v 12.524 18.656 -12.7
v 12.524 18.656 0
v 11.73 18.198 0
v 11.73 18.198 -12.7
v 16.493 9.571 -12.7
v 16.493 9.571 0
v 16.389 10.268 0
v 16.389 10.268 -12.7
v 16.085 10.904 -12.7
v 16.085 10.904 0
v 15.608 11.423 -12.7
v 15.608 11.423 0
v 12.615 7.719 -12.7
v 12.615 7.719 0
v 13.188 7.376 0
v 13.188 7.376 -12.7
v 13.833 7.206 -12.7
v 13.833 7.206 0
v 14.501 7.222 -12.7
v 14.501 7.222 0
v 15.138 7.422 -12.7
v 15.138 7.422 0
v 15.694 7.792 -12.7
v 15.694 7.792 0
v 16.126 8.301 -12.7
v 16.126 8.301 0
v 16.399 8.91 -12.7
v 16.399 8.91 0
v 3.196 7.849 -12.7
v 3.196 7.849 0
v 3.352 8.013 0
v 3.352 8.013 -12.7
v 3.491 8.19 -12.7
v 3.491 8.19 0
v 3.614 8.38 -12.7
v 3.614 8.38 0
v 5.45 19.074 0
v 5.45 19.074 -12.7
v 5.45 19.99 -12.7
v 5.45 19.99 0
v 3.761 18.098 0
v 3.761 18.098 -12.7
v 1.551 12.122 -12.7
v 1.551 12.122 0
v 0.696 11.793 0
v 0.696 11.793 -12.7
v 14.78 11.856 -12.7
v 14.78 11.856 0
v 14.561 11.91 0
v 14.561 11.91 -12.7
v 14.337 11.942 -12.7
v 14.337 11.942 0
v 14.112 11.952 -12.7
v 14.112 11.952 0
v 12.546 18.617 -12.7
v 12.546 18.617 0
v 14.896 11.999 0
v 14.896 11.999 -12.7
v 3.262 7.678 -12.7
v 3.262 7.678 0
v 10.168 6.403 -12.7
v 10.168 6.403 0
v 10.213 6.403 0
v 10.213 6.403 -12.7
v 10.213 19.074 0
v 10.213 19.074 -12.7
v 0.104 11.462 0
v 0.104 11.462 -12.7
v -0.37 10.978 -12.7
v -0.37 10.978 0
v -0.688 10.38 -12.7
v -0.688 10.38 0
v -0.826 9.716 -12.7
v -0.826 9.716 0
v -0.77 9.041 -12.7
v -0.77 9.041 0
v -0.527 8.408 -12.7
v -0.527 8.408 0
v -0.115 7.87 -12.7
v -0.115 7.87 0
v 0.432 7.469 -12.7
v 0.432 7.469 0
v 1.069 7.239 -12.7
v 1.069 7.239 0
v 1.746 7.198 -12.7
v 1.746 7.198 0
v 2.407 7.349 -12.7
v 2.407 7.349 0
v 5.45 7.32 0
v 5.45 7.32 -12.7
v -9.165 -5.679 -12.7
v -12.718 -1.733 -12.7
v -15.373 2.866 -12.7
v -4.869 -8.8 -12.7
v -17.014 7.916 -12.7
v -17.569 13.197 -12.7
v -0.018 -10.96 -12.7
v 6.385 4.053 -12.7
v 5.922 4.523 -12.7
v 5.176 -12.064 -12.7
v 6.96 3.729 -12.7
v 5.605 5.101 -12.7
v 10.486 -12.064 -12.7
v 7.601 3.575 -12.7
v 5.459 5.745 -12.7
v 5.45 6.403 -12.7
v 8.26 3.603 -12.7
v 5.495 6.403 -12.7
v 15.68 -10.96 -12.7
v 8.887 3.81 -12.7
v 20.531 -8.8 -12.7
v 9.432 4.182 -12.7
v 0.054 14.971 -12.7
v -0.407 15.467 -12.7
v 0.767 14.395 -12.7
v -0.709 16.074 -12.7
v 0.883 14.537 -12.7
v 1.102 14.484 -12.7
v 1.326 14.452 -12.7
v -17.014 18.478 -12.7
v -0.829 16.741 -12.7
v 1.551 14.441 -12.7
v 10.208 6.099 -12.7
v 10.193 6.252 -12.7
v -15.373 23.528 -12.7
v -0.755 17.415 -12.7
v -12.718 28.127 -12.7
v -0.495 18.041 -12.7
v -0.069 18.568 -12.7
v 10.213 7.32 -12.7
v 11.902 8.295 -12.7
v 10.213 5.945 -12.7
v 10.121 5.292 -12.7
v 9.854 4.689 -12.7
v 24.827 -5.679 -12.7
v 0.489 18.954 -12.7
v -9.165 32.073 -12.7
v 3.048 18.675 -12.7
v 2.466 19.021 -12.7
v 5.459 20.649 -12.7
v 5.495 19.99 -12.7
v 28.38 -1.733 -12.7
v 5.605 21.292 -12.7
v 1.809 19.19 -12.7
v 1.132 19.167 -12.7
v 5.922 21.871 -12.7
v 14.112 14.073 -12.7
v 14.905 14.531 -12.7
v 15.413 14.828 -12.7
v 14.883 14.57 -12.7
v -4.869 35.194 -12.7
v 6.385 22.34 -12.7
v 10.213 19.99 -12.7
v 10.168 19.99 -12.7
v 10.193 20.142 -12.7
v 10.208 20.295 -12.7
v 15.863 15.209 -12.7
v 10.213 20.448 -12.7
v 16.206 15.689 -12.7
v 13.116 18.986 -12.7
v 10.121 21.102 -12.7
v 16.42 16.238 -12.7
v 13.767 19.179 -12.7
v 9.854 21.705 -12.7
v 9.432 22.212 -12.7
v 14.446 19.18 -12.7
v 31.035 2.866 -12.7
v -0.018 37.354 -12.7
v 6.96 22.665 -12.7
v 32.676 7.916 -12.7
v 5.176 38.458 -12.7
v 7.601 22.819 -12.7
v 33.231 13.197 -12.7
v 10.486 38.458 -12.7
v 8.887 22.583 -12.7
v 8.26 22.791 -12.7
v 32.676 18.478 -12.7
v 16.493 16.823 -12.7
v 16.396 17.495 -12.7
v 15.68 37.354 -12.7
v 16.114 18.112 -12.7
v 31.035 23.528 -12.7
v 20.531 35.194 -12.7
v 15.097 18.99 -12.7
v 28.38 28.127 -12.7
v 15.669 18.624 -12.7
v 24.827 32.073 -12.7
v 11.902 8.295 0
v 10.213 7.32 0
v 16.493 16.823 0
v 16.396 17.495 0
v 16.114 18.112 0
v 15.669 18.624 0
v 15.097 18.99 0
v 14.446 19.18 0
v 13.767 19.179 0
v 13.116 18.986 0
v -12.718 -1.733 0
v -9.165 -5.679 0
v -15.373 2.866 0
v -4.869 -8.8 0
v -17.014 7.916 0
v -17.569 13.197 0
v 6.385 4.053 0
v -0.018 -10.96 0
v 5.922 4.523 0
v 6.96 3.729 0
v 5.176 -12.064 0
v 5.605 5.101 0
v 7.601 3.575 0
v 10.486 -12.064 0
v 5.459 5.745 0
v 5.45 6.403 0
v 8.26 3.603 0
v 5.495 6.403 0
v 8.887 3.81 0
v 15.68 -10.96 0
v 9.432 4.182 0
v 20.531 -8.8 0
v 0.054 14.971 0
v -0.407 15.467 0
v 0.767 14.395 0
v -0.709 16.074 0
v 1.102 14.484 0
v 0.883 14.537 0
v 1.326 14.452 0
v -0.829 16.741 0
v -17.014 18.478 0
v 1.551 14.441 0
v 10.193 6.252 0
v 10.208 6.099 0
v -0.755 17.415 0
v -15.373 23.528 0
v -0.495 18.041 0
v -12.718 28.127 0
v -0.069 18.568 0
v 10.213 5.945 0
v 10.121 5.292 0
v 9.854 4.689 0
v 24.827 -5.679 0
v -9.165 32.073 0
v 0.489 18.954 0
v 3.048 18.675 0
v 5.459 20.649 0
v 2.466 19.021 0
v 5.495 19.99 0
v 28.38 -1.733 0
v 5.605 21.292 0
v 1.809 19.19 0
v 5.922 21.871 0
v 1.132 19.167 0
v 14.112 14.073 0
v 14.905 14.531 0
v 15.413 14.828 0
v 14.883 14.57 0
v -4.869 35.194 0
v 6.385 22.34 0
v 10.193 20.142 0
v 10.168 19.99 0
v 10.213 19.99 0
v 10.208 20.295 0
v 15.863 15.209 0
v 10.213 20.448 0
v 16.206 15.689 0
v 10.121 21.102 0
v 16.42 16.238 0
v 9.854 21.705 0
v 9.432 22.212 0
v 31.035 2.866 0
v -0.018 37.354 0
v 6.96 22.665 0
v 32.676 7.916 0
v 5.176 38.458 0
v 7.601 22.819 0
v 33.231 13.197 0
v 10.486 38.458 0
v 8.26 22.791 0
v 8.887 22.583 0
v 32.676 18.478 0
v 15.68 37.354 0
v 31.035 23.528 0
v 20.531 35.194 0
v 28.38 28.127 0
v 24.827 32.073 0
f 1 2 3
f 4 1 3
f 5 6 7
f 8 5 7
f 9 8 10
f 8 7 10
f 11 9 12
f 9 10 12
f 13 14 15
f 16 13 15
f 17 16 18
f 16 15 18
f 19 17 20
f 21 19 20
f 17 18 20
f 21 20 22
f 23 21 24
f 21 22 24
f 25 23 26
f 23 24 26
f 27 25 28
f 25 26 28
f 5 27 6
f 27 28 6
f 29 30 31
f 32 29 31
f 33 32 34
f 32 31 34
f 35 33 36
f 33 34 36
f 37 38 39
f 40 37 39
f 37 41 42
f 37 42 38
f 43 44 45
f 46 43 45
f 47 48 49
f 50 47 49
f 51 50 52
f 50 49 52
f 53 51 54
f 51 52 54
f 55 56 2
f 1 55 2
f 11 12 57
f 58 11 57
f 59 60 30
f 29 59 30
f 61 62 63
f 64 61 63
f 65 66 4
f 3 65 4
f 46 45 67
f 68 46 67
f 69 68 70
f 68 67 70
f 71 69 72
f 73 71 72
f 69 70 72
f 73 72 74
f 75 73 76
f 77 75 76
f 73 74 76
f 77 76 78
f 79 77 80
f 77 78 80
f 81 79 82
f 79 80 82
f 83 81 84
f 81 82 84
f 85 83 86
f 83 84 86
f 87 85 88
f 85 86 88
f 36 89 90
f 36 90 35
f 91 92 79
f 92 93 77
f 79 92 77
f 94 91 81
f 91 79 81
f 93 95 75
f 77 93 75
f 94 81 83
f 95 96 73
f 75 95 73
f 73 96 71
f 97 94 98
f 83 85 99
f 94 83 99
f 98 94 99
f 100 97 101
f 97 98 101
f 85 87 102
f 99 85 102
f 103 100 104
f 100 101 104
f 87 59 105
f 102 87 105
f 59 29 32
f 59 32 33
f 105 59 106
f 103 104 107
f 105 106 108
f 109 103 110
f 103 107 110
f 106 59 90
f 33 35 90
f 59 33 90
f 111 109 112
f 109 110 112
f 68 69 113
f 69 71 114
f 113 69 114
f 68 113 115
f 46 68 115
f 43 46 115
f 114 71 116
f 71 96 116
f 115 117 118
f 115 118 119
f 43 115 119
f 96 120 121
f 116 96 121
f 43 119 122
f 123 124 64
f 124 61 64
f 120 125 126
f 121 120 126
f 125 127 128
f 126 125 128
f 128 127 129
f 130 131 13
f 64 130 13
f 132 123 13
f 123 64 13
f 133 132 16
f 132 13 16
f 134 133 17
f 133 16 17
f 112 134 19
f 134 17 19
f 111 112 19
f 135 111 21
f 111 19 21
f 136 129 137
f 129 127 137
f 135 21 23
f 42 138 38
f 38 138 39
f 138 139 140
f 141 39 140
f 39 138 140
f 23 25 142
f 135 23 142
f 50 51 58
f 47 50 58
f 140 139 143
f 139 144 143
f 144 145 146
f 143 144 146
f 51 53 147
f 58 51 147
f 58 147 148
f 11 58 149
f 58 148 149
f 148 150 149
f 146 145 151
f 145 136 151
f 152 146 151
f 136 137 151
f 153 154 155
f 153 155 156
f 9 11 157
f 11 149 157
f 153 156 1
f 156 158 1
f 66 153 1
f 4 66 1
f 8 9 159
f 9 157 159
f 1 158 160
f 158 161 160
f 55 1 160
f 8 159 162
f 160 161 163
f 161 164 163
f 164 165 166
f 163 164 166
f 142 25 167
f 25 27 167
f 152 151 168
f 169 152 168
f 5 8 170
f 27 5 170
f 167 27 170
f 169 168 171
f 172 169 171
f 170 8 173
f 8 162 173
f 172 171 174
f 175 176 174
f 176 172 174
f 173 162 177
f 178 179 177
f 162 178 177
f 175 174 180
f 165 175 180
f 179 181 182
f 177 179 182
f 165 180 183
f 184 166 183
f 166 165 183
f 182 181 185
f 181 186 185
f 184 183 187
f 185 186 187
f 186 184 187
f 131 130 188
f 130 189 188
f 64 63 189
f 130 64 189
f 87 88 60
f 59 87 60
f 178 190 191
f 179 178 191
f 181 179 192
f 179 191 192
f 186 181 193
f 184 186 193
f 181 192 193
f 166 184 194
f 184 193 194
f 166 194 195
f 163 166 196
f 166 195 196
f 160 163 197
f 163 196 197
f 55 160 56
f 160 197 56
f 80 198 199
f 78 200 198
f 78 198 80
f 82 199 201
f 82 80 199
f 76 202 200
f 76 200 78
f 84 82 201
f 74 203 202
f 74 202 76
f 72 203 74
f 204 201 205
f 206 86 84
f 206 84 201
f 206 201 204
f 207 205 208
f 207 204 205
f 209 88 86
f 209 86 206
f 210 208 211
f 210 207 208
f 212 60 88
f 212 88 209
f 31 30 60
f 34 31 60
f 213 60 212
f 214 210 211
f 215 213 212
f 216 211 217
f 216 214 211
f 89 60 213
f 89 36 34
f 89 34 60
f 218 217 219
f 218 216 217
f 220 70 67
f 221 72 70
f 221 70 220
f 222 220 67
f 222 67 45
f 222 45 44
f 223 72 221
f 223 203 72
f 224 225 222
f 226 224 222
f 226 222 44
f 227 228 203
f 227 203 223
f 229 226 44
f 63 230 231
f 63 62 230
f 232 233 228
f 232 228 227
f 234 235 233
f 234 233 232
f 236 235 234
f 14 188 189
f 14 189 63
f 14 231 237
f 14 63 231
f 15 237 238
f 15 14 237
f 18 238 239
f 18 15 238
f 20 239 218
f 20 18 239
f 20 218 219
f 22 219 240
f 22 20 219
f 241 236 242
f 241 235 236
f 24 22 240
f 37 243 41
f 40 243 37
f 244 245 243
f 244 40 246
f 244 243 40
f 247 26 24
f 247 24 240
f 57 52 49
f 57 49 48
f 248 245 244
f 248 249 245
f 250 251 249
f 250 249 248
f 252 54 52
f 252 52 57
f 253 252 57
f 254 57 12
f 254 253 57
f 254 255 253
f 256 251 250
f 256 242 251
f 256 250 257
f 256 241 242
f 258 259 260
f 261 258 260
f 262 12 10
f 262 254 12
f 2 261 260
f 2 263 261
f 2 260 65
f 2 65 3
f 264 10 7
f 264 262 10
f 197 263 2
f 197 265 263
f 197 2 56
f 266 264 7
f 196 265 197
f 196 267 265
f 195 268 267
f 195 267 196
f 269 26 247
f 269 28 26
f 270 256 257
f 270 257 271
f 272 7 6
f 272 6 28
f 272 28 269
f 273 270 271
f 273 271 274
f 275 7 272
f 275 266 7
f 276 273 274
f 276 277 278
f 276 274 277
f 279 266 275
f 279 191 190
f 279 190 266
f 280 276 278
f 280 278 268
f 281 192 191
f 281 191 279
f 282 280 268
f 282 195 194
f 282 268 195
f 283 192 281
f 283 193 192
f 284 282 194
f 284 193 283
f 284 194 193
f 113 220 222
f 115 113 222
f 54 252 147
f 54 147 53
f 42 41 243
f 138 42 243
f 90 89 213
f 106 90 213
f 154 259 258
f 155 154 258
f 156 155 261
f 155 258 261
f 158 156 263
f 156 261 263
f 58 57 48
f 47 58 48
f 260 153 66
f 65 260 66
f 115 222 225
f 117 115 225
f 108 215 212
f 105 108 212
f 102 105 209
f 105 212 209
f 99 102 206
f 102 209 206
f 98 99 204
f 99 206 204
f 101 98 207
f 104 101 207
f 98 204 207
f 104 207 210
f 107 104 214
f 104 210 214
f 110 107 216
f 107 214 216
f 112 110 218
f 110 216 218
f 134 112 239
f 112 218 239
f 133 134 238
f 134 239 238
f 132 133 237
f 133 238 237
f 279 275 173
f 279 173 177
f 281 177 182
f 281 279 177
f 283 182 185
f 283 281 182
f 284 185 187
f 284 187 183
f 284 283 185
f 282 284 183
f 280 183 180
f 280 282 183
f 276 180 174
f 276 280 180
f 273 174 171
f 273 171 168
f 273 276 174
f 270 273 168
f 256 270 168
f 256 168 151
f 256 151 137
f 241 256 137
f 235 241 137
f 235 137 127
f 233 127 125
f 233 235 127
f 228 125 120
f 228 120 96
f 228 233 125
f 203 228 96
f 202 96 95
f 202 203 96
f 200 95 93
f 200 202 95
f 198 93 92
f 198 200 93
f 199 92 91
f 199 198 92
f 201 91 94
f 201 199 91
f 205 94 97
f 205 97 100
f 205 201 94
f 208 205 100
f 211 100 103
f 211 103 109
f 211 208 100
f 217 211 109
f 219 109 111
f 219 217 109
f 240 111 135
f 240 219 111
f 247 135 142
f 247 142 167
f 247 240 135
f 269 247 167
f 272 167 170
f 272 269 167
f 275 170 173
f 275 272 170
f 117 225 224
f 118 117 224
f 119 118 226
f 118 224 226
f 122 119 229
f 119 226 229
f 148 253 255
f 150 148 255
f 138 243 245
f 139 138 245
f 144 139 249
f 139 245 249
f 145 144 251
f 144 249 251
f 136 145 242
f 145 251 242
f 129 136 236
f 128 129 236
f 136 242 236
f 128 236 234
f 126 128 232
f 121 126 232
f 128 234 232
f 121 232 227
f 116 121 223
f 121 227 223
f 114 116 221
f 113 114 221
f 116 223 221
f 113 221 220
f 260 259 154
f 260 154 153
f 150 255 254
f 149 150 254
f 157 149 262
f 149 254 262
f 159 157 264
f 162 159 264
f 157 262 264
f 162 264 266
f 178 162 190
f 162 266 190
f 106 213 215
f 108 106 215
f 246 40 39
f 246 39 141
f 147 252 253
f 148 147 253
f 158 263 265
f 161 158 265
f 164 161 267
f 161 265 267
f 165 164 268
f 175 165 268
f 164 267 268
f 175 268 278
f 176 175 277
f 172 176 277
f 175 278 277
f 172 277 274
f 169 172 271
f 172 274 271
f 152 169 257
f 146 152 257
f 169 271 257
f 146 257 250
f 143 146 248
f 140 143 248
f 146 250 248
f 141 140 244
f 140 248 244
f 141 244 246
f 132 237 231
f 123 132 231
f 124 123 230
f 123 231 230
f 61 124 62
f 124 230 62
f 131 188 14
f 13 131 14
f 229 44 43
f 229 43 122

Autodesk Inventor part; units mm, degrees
ref_plane "YZ Plane" through (0, 0, 0) normal (1, 0, 0) x (0, 1, 0)
ref_plane "XZ Plane" through (0, 0, 0) normal (0, 1, 0) x (-1, 0, 0)
ref_plane "XY Plane" through (0, 0, 0) normal (0, 0, 1) x (1, 0, 0)
sketch "Sketch1" plane through (0, 0, 0) normal (0, 0, 1) x (1, 0, 0)
  line L0 (7.8314, 13.1968) -> (7.8314, 20.4485) construction
  line L1 (7.8314, 13.1968) -> (14.1116, 16.8227) construction
  circle A0 centre (7.8314, 13.1968) radius 6.35 construction
  line L2 (7.8314, 13.1968) -> (14.1116, 9.571) construction
  line L3 (7.8314, 13.1968) -> (7.8314, 5.9451) construction
  line L4 (7.8314, 13.1968) -> (1.5513, 9.571) construction
  line L5 (7.8314, 13.1968) -> (1.5513, 16.8227) construction
  line L6 (7.8314, 20.4485) -> (14.1116, 16.8227)
  line L7 (14.1116, 16.8227) -> (14.1116, 9.571)
  line L8 (7.8314, 5.9451) -> (14.1116, 9.571)
  line L9 (7.8314, 5.9451) -> (1.5513, 9.571)
  line L10 (1.5513, 9.571) -> (1.5513, 16.8227)
  line L11 (1.5513, 16.8227) -> (7.8314, 20.4485)
  circle A1 centre (7.8314, 13.1968) radius 25.4
  circle A2 centre (7.8314, 20.4485) radius 2.3813
  circle A3 centre (14.1116, 16.8227) radius 2.3813
  circle A4 centre (14.1116, 9.571) radius 2.3813
  circle A5 centre (7.8314, 5.9451) radius 2.3813
  circle A6 centre (1.5513, 9.571) radius 2.3813
  circle A7 centre (1.5513, 16.8227) radius 2.3813
  line L12 (5.4502, 19.9903) -> (10.2127, 19.9903)
  line L13 (10.2127, 19.9903) -> (10.2127, 19.0737)
  line L14 (10.2127, 19.0737) -> (5.4502, 19.0737)
  line L15 (5.4502, 19.0737) -> (5.4502, 19.9903)
  line L16 (11.9019, 8.2952) -> (12.6147, 7.719)
  line L17 (12.6147, 7.719) -> (15.6085, 11.4229)
  line L18 (15.6085, 11.4229) -> (14.8957, 11.9991)
  line L19 (14.8957, 11.9991) -> (11.9019, 8.2952)
  line L20 (5.4502, 7.3199) -> (5.4502, 6.4034)
  line L21 (5.4502, 6.4034) -> (10.2127, 6.4034)
  line L22 (10.2127, 6.4034) -> (10.2127, 7.3199)
  line L23 (10.2127, 7.3199) -> (5.4502, 7.3199)
  line L24 (1.5513, 12.1225) -> (0.6959, 11.7933)
  line L25 (0.6959, 11.7933) -> (2.4066, 7.3487)
  line L26 (2.4066, 7.3487) -> (3.262, 7.6779)
  line L27 (3.262, 7.6779) -> (1.5513, 12.1225)
  line L28 (3.761, 18.0984) -> (3.0482, 18.6746)
  line L29 (3.0482, 18.6746) -> (0.0544, 14.9707)
  line L30 (0.0544, 14.9707) -> (0.7672, 14.3946)
  line L31 (0.7672, 14.3946) -> (3.761, 18.0984)
  line L32 (14.1116, 14.073) -> (14.9053, 14.5313)
  line L33 (14.9053, 14.5313) -> (12.5241, 18.6558)
  line L34 (12.5241, 18.6558) -> (11.7303, 18.1975)
  line L35 (11.7303, 18.1975) -> (14.1116, 14.073)
  circle A8 centre (7.8314, 13.1968) radius 4.0132 construction
  dimension "d9" = 4.7625
  dimension "d11" = 4.7625
  dimension "d0" = 7.2517
  dimension "d1" = 12.7
  dimension "d2" = 60
  dimension "d3" = 60
  dimension "d4" = 60
  dimension "d5" = 60
  dimension "d6" = 60
  dimension "d7" = 4.7625
  dimension "d8" = 4.7625
  dimension "d10" = 4.7625
  dimension "d12" = 4.7625
  dimension "d13" = 50.8
  dimension "d14" = 0.9165
  dimension "d16" = 0.9165
  dimension "d17" = 0.9165
  dimension "d18" = 0.9165
  dimension "d19" = 0.9165
  dimension "d20" = 0.9165
  dimension "d24" = 2.3368
extrude "Extrusion1" add sketch "Sketch1" against normal blind 12.7
equation "\"d9\" = d7"
equation "\"d11\" = d7"
equation "\"d8\" = d7"
equation "\"d10\" = d7"
equation "\"d12\" = d7"
properties part number "augmented gear v2"
